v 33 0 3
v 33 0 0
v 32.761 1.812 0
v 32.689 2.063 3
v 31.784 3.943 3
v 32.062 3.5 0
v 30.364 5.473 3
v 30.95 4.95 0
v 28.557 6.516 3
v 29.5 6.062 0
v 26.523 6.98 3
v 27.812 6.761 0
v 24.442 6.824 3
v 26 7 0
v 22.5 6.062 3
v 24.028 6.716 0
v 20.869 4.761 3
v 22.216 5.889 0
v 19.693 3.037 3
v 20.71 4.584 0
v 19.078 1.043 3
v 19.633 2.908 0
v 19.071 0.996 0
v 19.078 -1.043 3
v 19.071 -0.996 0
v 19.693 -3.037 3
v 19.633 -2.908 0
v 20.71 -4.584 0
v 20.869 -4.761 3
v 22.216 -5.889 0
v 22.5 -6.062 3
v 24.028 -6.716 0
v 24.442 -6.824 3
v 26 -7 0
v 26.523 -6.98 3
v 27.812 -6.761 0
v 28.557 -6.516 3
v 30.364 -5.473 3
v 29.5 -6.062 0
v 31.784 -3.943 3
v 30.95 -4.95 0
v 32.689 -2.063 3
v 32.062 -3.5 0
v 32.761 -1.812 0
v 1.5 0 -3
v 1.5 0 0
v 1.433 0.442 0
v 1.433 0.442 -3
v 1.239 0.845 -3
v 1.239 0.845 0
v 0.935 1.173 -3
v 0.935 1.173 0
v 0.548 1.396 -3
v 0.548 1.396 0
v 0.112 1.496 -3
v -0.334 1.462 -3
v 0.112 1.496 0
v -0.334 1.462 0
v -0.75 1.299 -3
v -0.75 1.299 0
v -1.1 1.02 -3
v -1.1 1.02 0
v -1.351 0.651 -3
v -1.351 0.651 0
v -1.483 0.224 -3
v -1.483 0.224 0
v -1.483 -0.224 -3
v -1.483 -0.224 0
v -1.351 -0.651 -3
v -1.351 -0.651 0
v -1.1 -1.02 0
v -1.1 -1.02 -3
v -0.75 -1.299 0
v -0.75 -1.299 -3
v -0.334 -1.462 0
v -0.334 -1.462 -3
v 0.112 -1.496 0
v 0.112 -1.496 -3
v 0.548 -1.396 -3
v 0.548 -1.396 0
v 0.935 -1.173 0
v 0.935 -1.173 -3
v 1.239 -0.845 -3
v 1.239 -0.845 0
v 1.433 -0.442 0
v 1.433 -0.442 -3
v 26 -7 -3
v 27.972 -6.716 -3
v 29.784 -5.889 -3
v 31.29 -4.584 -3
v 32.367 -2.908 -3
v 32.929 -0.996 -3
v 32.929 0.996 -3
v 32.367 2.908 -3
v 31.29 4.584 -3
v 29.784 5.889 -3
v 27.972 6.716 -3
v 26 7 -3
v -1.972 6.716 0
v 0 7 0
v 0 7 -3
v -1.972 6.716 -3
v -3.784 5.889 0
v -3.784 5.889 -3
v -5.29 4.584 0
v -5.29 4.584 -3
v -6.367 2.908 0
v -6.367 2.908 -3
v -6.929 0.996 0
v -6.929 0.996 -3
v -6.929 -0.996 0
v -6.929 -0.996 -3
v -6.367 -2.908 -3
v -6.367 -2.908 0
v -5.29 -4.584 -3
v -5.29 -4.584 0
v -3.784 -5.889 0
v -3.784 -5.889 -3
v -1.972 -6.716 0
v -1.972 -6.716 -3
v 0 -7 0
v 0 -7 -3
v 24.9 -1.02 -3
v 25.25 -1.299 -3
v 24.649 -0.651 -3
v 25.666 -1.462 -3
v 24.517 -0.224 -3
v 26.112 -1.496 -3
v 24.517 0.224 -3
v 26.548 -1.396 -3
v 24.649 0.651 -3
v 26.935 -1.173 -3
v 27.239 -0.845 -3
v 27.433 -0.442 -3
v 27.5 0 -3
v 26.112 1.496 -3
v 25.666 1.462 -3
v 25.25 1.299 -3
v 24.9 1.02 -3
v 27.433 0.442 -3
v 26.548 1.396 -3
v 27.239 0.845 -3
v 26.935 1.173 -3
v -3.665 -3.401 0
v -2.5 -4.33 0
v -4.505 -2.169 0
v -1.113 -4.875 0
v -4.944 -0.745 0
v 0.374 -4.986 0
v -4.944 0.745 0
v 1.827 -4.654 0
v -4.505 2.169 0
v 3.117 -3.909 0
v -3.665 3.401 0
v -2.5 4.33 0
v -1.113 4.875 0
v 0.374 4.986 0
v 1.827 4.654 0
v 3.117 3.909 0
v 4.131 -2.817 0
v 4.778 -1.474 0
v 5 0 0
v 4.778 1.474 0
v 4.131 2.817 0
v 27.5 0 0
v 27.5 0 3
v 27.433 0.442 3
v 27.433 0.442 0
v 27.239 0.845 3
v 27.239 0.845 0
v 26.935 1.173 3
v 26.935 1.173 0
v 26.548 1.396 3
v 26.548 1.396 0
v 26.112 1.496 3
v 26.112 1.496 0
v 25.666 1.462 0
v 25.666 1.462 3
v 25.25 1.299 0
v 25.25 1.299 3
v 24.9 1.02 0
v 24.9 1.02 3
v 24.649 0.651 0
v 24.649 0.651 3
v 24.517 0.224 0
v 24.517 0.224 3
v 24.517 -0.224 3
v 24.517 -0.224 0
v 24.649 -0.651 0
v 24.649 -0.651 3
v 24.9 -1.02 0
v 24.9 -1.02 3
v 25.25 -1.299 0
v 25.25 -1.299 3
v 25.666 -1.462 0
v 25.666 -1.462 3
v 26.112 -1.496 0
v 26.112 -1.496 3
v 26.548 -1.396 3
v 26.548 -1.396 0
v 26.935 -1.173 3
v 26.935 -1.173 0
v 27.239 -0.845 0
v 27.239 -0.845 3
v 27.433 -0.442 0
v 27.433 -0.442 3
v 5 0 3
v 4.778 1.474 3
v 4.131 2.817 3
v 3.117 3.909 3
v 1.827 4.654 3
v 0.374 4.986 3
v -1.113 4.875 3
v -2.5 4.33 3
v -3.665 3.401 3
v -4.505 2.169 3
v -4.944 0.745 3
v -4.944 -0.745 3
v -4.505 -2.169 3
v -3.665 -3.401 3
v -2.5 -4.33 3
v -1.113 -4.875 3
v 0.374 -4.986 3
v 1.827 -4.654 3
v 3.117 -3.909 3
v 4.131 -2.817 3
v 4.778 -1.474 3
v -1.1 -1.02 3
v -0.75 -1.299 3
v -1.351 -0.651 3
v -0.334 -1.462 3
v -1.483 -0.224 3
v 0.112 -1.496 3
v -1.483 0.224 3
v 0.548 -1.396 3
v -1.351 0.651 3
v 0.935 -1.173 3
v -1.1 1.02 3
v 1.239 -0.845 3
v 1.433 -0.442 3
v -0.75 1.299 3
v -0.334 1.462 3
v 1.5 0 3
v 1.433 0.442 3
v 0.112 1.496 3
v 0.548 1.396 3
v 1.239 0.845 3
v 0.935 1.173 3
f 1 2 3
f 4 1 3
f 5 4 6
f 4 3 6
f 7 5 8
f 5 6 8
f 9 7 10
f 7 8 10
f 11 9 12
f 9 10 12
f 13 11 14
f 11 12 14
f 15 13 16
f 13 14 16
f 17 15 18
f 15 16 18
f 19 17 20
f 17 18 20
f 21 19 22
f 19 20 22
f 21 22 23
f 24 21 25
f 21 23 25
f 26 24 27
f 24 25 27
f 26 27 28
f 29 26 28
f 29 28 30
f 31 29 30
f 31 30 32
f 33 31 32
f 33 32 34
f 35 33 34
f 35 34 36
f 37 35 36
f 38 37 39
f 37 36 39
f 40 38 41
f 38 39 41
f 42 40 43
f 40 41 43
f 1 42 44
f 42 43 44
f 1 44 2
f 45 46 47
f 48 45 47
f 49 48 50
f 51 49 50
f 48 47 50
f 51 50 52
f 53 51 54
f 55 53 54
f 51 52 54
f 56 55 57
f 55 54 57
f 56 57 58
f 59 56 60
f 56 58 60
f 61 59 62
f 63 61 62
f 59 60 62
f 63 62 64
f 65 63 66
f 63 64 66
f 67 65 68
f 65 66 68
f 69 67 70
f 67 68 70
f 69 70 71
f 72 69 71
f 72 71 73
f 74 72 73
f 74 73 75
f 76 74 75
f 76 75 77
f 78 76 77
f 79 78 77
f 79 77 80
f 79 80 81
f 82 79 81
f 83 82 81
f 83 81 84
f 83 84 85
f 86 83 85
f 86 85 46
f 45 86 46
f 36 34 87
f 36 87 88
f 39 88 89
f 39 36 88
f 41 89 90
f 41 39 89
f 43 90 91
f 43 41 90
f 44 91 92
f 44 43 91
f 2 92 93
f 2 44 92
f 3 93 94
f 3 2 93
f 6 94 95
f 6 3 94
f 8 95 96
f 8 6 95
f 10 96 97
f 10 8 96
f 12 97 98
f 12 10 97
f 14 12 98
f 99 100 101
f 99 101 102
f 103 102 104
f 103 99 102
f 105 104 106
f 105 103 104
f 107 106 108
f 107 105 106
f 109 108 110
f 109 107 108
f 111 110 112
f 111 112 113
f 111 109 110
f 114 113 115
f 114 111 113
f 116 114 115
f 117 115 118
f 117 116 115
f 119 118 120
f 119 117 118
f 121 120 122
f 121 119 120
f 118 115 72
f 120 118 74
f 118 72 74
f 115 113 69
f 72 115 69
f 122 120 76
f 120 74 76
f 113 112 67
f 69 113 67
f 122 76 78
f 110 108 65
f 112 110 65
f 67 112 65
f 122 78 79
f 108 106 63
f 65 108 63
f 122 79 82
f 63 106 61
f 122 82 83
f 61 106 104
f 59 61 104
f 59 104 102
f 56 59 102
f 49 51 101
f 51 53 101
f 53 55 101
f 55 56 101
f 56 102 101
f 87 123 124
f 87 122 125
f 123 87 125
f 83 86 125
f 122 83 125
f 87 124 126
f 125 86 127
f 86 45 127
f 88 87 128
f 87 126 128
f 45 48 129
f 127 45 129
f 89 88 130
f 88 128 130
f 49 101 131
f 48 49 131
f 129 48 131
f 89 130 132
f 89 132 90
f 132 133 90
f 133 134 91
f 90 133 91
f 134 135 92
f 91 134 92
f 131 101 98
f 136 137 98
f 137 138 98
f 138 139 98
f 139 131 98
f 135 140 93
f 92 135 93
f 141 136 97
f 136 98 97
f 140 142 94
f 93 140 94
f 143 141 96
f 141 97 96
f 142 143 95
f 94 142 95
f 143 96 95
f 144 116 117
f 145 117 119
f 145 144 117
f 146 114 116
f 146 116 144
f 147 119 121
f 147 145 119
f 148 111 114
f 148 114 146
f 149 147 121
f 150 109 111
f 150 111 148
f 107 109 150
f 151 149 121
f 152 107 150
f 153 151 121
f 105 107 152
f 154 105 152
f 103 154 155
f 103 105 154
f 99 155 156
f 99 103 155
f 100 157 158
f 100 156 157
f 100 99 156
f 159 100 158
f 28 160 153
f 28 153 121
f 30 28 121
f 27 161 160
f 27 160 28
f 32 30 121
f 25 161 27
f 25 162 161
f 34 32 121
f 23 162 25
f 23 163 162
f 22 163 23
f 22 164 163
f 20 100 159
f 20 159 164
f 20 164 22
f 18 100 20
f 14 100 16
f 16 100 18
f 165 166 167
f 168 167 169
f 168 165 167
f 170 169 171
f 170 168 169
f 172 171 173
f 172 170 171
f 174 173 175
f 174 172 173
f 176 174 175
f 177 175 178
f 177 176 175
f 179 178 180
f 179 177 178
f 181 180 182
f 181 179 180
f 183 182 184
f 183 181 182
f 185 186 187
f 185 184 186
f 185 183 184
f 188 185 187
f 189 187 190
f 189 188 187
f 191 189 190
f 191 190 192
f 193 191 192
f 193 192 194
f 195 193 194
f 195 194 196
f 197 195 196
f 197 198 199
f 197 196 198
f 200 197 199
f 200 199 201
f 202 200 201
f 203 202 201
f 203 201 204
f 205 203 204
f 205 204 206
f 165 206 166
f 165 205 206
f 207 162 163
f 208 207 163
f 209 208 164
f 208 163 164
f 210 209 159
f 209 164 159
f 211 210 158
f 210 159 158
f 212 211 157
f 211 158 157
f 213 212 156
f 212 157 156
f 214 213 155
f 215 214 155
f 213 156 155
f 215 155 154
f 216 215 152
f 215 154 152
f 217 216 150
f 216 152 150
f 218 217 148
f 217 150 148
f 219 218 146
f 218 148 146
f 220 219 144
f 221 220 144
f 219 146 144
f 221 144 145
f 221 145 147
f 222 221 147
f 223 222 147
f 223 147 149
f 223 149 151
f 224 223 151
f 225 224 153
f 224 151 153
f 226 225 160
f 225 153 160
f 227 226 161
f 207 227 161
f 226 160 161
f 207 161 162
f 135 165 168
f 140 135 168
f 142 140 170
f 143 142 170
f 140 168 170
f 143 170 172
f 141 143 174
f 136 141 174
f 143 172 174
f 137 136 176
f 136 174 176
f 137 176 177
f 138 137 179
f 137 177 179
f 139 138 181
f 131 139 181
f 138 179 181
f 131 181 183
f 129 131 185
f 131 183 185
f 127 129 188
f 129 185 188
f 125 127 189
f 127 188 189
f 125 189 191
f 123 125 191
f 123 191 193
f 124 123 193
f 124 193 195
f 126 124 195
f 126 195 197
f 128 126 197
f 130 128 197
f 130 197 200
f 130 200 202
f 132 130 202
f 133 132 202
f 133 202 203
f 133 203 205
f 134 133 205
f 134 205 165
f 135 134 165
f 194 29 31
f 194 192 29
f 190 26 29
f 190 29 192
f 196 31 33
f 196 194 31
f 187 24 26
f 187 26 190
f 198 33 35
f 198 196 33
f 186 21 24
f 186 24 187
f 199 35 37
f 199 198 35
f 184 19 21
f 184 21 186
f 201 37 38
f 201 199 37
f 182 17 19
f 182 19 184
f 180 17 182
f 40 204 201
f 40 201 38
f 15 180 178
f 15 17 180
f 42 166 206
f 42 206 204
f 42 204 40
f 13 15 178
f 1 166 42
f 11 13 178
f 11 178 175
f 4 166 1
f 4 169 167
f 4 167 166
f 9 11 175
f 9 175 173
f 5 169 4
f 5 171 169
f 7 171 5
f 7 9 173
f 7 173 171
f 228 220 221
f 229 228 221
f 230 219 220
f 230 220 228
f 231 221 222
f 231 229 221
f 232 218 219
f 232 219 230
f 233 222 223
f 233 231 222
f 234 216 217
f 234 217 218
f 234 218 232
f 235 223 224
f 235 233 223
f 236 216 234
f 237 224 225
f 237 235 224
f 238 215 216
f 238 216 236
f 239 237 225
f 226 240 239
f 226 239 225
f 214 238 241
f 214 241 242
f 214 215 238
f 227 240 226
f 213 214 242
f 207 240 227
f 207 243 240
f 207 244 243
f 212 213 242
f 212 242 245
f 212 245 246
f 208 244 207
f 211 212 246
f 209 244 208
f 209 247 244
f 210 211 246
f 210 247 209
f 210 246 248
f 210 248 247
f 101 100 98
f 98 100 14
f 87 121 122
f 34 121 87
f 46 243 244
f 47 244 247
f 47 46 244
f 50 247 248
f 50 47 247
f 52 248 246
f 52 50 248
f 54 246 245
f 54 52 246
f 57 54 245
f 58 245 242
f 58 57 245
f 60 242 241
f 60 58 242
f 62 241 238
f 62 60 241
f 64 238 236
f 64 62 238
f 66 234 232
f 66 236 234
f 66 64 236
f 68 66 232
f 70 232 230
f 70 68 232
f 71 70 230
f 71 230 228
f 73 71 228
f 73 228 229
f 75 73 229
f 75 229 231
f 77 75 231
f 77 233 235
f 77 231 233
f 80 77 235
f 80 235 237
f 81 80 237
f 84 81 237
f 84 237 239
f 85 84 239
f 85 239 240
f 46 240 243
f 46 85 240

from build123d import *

# Parameters (mm, degrees)
PAD_DEPTH         = 3
SKETCH001_R       = 7
SKETCH001_R_2     = 5
PAD001_DEPTH      = 3
SKETCH002_R       = 1.5
POCKET_DEPTH      = 3.001
POCKET_DEPTH_BACK = -3.001


with BuildPart() as part:
    # Sketch → Pad (new body)
    with BuildSketch(Plane.XY):
        with BuildLine():
            ThreePointArc((0, 7), (-7, 0), (0, -7))
            Line((0, -7), (26, -7))
            ThreePointArc((26, -7), (33, 0), (26, 7))
            Line((0, 7), (26, 7))
        make_face()
    extrude(amount=-PAD_DEPTH)

    # Sketch001 → Pad001 (join)
    with BuildSketch(Plane.XY):
        with Locations((26, 0)):
            Circle(SKETCH001_R)
        Circle(SKETCH001_R_2)
    extrude(amount=PAD001_DEPTH)

    # Sketch002 → Pocket (cut, two sides)
    with BuildSketch(Plane.XY) as pocket_sk:
        Circle(SKETCH002_R)
        with Locations((26, 0)):
            Circle(SKETCH002_R)
    extrude(amount=-POCKET_DEPTH, mode=Mode.SUBTRACT)
    extrude(pocket_sk.sketch, amount=-POCKET_DEPTH_BACK, mode=Mode.SUBTRACT)


solid = part.part
